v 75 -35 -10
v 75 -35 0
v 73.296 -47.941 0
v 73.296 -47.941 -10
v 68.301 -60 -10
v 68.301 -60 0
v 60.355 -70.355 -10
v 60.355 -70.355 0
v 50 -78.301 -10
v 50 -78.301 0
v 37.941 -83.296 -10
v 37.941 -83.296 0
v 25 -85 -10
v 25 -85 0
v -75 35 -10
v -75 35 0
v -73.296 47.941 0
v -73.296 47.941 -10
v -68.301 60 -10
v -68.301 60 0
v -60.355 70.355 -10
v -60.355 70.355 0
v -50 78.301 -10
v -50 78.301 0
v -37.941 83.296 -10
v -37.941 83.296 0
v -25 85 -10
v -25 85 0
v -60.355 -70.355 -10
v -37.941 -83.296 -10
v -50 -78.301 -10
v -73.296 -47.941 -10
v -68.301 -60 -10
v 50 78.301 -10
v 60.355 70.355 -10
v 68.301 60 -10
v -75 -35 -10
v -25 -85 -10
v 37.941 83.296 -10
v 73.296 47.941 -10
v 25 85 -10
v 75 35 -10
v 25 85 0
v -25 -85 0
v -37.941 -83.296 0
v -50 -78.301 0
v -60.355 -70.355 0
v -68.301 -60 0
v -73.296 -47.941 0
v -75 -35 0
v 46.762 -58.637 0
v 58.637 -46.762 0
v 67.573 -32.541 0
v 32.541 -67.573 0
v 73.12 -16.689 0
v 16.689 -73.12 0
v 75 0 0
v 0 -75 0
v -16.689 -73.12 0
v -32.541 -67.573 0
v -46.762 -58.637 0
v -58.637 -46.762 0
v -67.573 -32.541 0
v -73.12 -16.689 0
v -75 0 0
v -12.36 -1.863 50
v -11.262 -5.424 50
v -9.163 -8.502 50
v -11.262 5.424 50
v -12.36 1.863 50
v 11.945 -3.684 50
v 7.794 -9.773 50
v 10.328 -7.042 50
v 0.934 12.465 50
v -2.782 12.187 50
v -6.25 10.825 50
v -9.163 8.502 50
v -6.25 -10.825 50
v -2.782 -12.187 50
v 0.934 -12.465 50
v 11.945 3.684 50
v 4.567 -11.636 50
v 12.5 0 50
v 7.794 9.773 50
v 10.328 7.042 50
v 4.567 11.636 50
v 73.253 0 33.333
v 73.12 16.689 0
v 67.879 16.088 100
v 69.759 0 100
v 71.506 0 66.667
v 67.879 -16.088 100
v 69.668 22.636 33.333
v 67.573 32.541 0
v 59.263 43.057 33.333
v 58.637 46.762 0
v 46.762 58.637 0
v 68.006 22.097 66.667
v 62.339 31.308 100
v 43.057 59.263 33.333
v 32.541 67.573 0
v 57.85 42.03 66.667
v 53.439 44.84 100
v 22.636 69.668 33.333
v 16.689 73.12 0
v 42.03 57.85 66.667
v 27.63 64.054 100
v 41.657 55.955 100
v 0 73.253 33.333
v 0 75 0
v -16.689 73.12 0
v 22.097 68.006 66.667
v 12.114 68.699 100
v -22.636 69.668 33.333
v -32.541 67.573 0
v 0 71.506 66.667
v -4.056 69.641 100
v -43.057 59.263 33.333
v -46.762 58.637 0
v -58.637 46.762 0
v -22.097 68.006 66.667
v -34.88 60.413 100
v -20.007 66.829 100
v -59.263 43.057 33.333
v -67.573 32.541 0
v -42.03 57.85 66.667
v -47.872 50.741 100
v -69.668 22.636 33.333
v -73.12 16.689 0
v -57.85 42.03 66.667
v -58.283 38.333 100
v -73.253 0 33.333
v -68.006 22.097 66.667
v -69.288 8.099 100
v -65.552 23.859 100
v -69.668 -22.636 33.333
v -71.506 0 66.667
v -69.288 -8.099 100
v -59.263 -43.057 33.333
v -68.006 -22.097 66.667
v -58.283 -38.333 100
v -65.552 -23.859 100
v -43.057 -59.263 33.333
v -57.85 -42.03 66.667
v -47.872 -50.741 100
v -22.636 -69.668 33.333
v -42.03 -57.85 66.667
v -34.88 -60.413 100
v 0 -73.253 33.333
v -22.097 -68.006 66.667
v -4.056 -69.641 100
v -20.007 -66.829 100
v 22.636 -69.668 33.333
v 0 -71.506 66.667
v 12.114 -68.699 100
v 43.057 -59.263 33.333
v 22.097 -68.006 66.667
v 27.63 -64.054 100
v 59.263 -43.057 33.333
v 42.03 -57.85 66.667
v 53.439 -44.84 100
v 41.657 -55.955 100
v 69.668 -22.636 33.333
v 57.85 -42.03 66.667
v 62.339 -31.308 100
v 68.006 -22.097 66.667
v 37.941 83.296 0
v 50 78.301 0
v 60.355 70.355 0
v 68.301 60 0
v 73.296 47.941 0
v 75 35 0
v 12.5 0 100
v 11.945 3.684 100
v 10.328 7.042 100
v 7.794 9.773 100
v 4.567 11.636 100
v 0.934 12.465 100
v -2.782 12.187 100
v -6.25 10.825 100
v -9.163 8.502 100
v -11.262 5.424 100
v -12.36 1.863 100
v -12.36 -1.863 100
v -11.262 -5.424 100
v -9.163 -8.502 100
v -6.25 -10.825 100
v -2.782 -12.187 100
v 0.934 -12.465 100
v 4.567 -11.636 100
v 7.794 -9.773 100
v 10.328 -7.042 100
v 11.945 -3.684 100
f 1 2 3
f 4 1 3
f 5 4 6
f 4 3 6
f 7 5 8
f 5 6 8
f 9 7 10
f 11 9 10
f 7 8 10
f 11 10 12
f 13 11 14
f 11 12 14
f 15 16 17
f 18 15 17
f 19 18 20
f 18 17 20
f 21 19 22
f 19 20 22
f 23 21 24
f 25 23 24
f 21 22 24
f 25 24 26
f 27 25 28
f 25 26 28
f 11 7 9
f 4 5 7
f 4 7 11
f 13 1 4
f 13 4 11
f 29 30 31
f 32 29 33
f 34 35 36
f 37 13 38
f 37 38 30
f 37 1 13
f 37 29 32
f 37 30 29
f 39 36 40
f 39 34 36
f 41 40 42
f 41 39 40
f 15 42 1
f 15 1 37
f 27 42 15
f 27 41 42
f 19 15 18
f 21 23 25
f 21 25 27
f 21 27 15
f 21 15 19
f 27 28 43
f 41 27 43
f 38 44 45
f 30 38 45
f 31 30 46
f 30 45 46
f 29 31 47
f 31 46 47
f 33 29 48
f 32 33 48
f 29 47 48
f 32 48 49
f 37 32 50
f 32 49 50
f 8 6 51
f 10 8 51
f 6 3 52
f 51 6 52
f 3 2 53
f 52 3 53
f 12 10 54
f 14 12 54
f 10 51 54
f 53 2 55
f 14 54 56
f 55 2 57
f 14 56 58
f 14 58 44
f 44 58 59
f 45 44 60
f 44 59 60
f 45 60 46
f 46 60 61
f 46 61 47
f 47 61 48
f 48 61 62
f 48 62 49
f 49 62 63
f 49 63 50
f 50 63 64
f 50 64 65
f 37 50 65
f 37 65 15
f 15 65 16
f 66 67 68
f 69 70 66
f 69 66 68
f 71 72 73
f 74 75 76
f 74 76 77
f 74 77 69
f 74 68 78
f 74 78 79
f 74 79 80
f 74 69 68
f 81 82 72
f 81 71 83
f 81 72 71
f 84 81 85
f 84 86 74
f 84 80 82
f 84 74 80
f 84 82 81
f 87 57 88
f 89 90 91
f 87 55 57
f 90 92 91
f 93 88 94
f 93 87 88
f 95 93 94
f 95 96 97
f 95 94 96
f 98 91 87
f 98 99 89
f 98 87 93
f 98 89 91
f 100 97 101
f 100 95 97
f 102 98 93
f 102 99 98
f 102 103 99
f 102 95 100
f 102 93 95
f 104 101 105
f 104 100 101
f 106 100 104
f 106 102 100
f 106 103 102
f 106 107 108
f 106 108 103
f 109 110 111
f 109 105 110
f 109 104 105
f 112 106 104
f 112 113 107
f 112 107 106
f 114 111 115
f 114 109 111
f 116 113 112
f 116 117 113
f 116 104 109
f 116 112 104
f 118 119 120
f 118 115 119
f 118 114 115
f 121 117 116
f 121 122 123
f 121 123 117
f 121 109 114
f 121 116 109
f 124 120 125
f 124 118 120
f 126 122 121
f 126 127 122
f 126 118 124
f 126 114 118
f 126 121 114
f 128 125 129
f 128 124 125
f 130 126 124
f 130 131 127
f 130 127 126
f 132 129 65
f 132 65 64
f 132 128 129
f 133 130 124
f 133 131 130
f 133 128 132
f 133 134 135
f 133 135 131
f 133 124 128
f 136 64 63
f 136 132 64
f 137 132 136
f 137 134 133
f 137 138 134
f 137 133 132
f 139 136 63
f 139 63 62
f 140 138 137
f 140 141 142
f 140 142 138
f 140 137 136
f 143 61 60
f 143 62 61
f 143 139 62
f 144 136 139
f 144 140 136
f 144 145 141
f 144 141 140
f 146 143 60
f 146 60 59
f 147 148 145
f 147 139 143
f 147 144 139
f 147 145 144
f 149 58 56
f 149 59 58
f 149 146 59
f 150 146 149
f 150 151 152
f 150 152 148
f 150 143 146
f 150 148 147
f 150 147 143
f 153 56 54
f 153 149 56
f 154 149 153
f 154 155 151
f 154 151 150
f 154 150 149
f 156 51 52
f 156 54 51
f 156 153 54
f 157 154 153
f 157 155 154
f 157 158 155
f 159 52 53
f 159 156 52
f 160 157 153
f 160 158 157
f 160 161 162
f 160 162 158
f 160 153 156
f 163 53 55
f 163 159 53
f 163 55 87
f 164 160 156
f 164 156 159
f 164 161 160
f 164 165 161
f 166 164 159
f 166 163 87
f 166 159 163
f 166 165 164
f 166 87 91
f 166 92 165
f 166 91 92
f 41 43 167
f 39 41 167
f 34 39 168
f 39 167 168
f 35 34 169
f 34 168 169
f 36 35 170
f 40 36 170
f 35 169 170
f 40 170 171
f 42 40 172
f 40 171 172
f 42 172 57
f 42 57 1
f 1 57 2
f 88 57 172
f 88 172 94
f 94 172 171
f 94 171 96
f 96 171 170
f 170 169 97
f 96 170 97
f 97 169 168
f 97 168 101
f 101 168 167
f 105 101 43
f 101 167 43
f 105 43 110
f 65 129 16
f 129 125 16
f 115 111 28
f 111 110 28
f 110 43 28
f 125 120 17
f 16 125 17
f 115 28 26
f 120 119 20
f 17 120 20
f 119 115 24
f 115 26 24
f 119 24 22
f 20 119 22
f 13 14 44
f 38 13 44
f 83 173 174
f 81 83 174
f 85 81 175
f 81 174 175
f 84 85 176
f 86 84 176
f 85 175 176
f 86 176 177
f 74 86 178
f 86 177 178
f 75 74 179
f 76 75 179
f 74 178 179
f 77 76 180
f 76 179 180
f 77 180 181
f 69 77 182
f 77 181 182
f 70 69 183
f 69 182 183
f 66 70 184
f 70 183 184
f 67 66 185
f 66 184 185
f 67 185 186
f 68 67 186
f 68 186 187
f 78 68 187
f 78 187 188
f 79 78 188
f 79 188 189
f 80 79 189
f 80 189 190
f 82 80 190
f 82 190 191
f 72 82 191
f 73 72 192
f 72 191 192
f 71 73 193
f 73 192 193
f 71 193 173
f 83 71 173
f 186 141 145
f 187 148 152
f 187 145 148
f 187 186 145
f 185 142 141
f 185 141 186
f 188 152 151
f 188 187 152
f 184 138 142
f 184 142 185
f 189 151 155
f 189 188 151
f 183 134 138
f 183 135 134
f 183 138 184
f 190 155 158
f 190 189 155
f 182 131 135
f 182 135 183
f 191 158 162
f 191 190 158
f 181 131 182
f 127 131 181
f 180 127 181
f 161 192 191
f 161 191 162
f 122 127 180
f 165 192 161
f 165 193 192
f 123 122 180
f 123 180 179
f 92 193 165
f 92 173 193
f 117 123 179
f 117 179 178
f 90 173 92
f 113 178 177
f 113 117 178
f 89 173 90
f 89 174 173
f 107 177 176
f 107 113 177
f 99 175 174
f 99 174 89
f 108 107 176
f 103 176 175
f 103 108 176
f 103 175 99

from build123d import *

# Parameters (mm, degrees)
SKETCH1_R           = 75
BOSS_EXTRUDE1_DEPTH = 100
BOSS_EXTRUDE1_TAPER = 3
BOSS_EXTRUDE2_DEPTH = 10
SKETCH3_R           = 12.5
CUT_EXTRUDE1_DEPTH  = 50


with BuildPart() as part:
    # Sketch1 → Boss-Extrude1 (new body)
    with BuildSketch(Plane.XY):
        Circle(SKETCH1_R)
    extrude(amount=BOSS_EXTRUDE1_DEPTH, taper=BOSS_EXTRUDE1_TAPER)

    # Sketch2 → Boss-Extrude2 (add)
    with BuildSketch(Plane(origin=(0, 0, 0), x_dir=(-1, 0, 0), z_dir=(0, 0, -1))):
        with BuildLine():
            Line((-25, -85), (25, -85))
            ThreePointArc((25, -85), (60.355339059, -70.355339059), (75, -35))
            Line((75, -35), (75, 35))
            ThreePointArc((75, 35), (60.355339059, 70.355339059), (25, 85))
            Line((25, 85), (-25, 85))
            ThreePointArc((-25, 85), (-60.355339059, 70.355339059), (-75, 35))
            Line((-75, 35), (-75, -35))
            ThreePointArc((-75, -35), (-60.355339059, -70.355339059), (-25, -85))
        make_face()
    extrude(amount=BOSS_EXTRUDE2_DEPTH)

    # Sketch3 → Cut-Extrude1 (cut)
    with BuildSketch(Plane.XY.offset(100)):
        Circle(SKETCH3_R)
    extrude(amount=-CUT_EXTRUDE1_DEPTH, mode=Mode.SUBTRACT)


solid = part.part
